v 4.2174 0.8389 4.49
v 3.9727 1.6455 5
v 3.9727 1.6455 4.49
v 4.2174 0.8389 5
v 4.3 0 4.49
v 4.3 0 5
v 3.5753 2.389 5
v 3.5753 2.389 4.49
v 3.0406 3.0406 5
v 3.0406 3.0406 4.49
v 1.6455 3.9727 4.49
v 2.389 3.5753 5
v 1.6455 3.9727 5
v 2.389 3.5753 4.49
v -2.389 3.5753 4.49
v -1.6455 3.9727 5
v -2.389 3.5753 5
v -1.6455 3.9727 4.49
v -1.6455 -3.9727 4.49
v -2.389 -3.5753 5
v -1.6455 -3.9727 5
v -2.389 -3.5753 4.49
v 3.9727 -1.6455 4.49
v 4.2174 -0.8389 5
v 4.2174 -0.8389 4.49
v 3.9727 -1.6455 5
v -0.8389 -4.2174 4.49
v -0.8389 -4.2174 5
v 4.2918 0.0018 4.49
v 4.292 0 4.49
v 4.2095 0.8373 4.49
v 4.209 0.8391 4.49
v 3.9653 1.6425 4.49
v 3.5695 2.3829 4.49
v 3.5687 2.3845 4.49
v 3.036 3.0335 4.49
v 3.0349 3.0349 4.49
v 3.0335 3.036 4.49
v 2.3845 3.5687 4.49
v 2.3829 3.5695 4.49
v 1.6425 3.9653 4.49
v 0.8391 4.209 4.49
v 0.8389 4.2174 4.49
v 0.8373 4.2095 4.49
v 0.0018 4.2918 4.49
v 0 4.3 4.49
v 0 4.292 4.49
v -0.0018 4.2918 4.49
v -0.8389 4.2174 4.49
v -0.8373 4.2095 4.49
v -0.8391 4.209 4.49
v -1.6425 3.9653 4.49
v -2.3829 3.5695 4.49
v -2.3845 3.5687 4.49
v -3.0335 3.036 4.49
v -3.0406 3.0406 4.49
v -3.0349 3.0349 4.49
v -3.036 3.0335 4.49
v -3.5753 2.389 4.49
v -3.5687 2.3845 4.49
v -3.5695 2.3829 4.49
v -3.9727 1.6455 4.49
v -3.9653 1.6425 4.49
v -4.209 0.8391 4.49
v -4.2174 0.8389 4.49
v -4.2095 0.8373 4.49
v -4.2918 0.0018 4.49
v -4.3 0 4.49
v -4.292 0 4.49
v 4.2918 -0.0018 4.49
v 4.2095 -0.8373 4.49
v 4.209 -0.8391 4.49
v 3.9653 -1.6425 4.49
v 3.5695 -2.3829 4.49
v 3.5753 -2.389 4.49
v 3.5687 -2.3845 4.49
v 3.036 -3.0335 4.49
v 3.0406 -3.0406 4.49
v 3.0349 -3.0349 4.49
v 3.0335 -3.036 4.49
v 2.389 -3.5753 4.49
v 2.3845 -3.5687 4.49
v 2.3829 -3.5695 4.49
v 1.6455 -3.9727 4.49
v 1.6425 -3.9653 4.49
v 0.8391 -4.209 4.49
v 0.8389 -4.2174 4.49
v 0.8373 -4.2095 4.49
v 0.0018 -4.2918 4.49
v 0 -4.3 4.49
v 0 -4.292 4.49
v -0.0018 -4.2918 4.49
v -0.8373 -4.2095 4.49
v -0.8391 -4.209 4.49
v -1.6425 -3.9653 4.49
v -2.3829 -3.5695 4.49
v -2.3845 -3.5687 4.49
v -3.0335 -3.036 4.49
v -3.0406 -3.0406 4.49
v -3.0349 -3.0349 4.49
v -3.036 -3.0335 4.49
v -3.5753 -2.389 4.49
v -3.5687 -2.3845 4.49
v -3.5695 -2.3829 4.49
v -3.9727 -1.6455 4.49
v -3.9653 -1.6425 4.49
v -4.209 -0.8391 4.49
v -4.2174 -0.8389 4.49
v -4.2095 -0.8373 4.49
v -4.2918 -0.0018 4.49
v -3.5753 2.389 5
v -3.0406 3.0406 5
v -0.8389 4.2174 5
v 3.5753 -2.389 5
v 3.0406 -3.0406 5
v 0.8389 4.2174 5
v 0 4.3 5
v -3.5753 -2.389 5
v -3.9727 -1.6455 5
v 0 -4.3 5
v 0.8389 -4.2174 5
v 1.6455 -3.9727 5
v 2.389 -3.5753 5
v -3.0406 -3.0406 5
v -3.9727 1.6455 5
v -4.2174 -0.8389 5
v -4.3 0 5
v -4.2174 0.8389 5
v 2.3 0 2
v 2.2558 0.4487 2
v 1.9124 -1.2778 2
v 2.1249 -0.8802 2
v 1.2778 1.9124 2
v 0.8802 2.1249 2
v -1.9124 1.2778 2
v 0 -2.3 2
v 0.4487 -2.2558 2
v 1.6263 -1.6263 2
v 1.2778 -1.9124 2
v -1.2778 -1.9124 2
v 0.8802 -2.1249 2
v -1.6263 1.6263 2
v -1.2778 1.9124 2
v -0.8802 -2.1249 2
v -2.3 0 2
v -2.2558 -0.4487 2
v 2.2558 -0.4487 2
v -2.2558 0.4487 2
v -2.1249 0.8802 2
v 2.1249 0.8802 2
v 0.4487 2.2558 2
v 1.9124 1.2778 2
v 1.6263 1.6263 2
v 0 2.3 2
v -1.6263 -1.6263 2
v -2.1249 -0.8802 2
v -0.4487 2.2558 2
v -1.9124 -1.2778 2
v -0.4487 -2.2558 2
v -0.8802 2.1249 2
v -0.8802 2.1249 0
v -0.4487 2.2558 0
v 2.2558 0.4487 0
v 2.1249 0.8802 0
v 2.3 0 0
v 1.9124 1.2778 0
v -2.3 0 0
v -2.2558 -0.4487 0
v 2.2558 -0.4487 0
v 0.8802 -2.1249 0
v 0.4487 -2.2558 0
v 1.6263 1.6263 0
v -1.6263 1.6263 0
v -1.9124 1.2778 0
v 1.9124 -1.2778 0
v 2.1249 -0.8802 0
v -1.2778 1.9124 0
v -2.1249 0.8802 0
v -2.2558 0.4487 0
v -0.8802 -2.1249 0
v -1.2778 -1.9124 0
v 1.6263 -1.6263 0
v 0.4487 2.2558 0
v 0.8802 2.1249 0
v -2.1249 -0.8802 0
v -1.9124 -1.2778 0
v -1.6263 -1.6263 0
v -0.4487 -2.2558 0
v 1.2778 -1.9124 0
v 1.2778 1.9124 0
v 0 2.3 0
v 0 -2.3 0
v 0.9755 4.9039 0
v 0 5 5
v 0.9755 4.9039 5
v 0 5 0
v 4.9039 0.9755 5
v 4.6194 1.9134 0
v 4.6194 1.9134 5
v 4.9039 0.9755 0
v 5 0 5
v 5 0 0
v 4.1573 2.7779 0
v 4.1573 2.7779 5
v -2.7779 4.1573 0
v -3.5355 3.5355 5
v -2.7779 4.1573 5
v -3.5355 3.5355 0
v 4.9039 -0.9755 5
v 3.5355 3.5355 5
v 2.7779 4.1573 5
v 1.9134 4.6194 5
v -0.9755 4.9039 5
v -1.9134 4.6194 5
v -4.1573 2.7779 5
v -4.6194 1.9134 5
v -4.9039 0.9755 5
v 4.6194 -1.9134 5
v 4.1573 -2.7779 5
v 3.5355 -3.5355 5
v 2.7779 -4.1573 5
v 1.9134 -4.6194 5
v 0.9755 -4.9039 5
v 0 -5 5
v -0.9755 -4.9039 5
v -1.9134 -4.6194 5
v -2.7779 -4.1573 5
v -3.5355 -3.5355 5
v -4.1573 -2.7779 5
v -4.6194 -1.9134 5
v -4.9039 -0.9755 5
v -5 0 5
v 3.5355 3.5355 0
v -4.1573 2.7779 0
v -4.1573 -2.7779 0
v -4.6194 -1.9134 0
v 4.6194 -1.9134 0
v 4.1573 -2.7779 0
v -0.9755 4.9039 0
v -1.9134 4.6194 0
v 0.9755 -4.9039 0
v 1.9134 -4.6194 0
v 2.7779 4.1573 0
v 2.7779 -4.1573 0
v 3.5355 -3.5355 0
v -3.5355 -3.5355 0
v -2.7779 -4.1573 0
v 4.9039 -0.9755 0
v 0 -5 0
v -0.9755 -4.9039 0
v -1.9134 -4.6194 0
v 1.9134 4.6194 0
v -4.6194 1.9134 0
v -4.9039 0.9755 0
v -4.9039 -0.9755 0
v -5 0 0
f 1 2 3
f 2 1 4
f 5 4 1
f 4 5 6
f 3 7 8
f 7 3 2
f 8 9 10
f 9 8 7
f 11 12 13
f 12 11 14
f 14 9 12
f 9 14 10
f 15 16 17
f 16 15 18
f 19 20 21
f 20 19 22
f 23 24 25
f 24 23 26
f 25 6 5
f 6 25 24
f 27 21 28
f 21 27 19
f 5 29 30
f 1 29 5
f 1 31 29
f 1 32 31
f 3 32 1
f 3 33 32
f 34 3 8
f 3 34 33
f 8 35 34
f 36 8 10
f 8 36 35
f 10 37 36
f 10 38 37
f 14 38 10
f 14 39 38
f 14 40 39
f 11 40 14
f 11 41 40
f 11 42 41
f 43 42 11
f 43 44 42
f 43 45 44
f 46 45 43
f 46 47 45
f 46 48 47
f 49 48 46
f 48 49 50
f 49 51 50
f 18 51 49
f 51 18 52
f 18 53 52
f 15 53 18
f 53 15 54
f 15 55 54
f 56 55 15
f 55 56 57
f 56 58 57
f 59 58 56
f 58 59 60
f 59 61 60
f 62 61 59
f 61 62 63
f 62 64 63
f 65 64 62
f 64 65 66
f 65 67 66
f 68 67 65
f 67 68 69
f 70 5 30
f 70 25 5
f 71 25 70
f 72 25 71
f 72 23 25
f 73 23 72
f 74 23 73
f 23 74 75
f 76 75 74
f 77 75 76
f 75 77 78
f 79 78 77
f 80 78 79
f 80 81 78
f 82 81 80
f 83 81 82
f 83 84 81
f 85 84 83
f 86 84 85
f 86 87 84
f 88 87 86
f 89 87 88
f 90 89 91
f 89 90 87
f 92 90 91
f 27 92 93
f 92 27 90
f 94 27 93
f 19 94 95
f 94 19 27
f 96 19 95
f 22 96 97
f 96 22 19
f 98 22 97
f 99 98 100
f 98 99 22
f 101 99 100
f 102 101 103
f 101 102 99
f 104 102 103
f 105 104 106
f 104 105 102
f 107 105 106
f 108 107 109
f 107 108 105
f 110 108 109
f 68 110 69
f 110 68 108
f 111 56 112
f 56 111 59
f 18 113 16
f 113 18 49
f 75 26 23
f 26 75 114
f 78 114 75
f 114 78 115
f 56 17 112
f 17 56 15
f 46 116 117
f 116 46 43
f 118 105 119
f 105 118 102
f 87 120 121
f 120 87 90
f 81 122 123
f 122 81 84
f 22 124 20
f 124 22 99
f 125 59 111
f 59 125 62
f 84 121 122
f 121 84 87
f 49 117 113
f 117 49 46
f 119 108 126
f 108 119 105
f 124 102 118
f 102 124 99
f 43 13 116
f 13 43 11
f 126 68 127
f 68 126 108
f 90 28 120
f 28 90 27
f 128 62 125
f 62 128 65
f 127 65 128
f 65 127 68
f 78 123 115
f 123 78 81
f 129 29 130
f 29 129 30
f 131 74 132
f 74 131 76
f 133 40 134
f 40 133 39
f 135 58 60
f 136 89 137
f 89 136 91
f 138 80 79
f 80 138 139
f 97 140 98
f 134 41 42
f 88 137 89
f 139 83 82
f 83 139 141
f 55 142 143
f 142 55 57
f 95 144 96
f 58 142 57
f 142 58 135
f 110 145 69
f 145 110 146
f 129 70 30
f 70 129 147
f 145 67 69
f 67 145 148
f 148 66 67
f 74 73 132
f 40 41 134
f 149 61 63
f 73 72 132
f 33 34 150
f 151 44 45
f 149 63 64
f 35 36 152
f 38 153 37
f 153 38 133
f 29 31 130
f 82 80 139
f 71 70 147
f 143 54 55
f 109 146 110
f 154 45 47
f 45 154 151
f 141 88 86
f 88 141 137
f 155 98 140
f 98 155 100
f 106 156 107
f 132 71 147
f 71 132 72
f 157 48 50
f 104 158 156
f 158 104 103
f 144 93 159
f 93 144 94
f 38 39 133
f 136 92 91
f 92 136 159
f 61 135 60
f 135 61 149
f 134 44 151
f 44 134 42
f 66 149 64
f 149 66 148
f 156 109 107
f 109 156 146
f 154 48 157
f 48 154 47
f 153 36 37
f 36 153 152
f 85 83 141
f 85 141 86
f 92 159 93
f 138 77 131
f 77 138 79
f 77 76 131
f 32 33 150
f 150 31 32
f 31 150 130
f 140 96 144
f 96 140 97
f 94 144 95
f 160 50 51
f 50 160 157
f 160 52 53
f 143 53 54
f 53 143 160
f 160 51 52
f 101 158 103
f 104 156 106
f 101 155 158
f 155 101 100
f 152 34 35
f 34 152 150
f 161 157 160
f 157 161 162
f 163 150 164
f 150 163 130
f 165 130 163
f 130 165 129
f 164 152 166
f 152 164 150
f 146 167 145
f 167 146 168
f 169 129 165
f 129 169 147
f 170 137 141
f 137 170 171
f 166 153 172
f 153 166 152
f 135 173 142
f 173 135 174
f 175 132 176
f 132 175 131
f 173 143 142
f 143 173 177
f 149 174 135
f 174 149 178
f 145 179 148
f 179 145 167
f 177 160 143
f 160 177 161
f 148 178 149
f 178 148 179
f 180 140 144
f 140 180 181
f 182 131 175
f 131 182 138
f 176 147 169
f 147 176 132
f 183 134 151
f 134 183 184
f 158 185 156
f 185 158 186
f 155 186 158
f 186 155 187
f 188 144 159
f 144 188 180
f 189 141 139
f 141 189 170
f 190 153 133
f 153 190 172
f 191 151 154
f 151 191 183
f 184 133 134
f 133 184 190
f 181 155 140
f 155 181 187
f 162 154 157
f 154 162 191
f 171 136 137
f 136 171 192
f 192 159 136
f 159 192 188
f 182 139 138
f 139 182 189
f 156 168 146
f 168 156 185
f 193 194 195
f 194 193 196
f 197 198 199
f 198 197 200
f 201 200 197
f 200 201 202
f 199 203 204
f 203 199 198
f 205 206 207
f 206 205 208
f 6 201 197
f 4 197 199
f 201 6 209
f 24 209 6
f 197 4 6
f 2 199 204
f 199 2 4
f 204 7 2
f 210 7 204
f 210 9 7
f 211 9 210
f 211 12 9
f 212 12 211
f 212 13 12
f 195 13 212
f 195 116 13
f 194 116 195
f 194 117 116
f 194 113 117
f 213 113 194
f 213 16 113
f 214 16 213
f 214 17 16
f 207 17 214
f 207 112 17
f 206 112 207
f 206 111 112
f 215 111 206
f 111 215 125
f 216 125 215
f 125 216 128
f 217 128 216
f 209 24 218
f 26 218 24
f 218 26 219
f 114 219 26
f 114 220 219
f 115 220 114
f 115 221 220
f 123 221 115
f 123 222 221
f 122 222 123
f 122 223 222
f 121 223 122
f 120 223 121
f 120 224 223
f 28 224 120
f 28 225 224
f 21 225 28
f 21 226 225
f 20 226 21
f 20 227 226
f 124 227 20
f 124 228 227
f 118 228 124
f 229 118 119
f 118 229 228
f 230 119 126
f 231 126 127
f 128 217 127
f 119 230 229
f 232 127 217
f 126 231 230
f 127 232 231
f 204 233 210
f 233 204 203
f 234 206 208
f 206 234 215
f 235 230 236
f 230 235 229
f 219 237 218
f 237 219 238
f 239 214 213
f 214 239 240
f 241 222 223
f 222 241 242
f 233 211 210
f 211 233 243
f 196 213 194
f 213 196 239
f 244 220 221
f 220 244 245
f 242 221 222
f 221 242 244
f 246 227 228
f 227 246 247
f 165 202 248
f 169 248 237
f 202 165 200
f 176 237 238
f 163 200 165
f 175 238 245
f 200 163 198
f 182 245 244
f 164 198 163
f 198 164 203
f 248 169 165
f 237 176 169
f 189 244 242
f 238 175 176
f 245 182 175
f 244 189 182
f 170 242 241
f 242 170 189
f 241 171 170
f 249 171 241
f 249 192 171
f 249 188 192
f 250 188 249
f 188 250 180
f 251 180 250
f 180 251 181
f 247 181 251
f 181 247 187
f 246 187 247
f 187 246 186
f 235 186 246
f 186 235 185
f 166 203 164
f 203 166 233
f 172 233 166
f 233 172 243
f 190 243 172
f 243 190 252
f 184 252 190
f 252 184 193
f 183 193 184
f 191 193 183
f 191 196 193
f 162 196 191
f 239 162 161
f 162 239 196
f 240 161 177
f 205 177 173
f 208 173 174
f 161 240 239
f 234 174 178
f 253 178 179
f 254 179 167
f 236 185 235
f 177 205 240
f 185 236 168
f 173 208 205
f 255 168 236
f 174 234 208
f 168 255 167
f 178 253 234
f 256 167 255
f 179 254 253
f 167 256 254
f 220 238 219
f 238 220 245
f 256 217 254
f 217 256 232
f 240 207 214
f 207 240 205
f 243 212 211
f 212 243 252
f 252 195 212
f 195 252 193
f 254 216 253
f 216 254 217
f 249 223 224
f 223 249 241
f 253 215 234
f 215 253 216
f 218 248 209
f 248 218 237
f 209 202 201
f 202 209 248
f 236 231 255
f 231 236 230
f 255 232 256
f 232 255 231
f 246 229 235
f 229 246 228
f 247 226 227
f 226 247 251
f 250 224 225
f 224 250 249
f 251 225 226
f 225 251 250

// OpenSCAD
difference() {
  $fn=32;
  cylinder(r=5,h=5);
  translate([0,0,-2]) woodScrewNum8();
}

module woodScrewNum10() {
  $fn=32;
  translate([0,0,7.99]) cylinder(r=5, h=4.1);
  translate([0,0,4]) cylinder(r1=2, r2=5, h=4);
  translate([0,0,-0.1])  cylinder(r=2.6, h=6);
}


module woodScrewNum8() {
  $fn=32;
  translate([0,0,6.49]) cylinder(r=4.3, h=3.6);
  translate([0,0,4]) cylinder(r1=2.3, r2=4.3, h=2.5);
  translate([0,0,-0.1]) cylinder(r=2.3, h=6);
}
